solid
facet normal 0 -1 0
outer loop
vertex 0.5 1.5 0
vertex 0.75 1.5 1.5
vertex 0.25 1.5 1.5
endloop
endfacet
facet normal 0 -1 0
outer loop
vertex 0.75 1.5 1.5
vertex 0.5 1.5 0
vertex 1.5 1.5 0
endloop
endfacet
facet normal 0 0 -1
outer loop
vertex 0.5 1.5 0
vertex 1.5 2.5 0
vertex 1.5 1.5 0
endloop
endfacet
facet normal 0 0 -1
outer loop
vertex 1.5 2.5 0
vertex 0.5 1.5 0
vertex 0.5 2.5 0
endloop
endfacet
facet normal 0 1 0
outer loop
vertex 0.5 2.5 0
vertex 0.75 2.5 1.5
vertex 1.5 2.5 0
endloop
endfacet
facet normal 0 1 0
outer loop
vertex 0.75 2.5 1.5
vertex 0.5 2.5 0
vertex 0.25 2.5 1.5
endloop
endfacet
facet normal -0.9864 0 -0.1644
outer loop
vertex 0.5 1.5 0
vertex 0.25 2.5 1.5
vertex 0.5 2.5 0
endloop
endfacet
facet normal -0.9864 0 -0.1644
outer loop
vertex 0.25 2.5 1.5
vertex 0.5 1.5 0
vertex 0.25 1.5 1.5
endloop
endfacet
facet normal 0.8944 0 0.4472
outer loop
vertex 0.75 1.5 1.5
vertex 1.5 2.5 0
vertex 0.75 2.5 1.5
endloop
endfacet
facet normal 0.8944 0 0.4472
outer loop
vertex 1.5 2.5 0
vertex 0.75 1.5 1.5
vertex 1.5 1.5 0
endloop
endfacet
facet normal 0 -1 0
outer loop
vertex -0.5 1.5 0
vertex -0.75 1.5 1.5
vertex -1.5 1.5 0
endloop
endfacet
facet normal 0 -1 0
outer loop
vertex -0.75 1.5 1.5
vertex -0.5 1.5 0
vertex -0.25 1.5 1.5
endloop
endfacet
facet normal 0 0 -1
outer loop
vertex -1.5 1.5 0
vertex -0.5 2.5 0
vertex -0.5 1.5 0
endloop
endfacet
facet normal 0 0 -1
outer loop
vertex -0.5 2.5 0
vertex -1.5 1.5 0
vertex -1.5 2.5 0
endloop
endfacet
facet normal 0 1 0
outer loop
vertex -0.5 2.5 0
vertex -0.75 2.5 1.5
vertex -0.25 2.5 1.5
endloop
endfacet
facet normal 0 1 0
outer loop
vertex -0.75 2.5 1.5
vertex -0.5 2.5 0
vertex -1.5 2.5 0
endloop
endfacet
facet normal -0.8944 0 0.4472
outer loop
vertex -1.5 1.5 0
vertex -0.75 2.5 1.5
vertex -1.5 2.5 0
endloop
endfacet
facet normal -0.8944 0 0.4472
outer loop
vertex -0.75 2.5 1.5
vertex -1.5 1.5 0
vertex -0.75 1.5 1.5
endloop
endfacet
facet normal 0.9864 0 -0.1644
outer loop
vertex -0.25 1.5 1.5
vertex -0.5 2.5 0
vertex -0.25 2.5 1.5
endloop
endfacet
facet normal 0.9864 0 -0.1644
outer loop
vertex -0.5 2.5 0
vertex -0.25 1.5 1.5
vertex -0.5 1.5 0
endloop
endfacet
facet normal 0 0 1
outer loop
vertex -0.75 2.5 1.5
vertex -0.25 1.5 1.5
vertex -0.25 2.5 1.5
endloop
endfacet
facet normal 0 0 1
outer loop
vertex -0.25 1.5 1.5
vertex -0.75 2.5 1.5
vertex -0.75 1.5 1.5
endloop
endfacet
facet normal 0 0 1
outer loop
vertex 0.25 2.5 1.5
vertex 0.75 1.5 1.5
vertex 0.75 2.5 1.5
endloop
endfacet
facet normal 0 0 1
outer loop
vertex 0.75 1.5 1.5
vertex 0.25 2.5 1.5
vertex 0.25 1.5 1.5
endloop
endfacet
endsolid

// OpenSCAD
// Creates the same "non-manifold" object (sharing one edge) using two techniques:
// o linear_extrude of two 2D objects
// o union of two linear_extrudes
//
// Subsequently cuts away the non-manifold part:
// -> the first technique fails, the second one succeeds
//
module cutoff() {
    difference() {
        children();
        translate([0,0,2.5]) cube(2, center=true);
    }
}

cutoff() {
    linear_extrude(height=3, scale=[0,1], convexity=2) {
        translate([1,0,0]) square(1,true);
        translate([-1,0,0]) square(1,true);
    }
}

translate([0,2,0]) cutoff() {
    linear_extrude(height=3, scale=[0,1]) translate([1,0,0]) square(1,true);
    linear_extrude(height=3, scale=[0,1]) translate([-1,0,0]) square(1,true);
}
